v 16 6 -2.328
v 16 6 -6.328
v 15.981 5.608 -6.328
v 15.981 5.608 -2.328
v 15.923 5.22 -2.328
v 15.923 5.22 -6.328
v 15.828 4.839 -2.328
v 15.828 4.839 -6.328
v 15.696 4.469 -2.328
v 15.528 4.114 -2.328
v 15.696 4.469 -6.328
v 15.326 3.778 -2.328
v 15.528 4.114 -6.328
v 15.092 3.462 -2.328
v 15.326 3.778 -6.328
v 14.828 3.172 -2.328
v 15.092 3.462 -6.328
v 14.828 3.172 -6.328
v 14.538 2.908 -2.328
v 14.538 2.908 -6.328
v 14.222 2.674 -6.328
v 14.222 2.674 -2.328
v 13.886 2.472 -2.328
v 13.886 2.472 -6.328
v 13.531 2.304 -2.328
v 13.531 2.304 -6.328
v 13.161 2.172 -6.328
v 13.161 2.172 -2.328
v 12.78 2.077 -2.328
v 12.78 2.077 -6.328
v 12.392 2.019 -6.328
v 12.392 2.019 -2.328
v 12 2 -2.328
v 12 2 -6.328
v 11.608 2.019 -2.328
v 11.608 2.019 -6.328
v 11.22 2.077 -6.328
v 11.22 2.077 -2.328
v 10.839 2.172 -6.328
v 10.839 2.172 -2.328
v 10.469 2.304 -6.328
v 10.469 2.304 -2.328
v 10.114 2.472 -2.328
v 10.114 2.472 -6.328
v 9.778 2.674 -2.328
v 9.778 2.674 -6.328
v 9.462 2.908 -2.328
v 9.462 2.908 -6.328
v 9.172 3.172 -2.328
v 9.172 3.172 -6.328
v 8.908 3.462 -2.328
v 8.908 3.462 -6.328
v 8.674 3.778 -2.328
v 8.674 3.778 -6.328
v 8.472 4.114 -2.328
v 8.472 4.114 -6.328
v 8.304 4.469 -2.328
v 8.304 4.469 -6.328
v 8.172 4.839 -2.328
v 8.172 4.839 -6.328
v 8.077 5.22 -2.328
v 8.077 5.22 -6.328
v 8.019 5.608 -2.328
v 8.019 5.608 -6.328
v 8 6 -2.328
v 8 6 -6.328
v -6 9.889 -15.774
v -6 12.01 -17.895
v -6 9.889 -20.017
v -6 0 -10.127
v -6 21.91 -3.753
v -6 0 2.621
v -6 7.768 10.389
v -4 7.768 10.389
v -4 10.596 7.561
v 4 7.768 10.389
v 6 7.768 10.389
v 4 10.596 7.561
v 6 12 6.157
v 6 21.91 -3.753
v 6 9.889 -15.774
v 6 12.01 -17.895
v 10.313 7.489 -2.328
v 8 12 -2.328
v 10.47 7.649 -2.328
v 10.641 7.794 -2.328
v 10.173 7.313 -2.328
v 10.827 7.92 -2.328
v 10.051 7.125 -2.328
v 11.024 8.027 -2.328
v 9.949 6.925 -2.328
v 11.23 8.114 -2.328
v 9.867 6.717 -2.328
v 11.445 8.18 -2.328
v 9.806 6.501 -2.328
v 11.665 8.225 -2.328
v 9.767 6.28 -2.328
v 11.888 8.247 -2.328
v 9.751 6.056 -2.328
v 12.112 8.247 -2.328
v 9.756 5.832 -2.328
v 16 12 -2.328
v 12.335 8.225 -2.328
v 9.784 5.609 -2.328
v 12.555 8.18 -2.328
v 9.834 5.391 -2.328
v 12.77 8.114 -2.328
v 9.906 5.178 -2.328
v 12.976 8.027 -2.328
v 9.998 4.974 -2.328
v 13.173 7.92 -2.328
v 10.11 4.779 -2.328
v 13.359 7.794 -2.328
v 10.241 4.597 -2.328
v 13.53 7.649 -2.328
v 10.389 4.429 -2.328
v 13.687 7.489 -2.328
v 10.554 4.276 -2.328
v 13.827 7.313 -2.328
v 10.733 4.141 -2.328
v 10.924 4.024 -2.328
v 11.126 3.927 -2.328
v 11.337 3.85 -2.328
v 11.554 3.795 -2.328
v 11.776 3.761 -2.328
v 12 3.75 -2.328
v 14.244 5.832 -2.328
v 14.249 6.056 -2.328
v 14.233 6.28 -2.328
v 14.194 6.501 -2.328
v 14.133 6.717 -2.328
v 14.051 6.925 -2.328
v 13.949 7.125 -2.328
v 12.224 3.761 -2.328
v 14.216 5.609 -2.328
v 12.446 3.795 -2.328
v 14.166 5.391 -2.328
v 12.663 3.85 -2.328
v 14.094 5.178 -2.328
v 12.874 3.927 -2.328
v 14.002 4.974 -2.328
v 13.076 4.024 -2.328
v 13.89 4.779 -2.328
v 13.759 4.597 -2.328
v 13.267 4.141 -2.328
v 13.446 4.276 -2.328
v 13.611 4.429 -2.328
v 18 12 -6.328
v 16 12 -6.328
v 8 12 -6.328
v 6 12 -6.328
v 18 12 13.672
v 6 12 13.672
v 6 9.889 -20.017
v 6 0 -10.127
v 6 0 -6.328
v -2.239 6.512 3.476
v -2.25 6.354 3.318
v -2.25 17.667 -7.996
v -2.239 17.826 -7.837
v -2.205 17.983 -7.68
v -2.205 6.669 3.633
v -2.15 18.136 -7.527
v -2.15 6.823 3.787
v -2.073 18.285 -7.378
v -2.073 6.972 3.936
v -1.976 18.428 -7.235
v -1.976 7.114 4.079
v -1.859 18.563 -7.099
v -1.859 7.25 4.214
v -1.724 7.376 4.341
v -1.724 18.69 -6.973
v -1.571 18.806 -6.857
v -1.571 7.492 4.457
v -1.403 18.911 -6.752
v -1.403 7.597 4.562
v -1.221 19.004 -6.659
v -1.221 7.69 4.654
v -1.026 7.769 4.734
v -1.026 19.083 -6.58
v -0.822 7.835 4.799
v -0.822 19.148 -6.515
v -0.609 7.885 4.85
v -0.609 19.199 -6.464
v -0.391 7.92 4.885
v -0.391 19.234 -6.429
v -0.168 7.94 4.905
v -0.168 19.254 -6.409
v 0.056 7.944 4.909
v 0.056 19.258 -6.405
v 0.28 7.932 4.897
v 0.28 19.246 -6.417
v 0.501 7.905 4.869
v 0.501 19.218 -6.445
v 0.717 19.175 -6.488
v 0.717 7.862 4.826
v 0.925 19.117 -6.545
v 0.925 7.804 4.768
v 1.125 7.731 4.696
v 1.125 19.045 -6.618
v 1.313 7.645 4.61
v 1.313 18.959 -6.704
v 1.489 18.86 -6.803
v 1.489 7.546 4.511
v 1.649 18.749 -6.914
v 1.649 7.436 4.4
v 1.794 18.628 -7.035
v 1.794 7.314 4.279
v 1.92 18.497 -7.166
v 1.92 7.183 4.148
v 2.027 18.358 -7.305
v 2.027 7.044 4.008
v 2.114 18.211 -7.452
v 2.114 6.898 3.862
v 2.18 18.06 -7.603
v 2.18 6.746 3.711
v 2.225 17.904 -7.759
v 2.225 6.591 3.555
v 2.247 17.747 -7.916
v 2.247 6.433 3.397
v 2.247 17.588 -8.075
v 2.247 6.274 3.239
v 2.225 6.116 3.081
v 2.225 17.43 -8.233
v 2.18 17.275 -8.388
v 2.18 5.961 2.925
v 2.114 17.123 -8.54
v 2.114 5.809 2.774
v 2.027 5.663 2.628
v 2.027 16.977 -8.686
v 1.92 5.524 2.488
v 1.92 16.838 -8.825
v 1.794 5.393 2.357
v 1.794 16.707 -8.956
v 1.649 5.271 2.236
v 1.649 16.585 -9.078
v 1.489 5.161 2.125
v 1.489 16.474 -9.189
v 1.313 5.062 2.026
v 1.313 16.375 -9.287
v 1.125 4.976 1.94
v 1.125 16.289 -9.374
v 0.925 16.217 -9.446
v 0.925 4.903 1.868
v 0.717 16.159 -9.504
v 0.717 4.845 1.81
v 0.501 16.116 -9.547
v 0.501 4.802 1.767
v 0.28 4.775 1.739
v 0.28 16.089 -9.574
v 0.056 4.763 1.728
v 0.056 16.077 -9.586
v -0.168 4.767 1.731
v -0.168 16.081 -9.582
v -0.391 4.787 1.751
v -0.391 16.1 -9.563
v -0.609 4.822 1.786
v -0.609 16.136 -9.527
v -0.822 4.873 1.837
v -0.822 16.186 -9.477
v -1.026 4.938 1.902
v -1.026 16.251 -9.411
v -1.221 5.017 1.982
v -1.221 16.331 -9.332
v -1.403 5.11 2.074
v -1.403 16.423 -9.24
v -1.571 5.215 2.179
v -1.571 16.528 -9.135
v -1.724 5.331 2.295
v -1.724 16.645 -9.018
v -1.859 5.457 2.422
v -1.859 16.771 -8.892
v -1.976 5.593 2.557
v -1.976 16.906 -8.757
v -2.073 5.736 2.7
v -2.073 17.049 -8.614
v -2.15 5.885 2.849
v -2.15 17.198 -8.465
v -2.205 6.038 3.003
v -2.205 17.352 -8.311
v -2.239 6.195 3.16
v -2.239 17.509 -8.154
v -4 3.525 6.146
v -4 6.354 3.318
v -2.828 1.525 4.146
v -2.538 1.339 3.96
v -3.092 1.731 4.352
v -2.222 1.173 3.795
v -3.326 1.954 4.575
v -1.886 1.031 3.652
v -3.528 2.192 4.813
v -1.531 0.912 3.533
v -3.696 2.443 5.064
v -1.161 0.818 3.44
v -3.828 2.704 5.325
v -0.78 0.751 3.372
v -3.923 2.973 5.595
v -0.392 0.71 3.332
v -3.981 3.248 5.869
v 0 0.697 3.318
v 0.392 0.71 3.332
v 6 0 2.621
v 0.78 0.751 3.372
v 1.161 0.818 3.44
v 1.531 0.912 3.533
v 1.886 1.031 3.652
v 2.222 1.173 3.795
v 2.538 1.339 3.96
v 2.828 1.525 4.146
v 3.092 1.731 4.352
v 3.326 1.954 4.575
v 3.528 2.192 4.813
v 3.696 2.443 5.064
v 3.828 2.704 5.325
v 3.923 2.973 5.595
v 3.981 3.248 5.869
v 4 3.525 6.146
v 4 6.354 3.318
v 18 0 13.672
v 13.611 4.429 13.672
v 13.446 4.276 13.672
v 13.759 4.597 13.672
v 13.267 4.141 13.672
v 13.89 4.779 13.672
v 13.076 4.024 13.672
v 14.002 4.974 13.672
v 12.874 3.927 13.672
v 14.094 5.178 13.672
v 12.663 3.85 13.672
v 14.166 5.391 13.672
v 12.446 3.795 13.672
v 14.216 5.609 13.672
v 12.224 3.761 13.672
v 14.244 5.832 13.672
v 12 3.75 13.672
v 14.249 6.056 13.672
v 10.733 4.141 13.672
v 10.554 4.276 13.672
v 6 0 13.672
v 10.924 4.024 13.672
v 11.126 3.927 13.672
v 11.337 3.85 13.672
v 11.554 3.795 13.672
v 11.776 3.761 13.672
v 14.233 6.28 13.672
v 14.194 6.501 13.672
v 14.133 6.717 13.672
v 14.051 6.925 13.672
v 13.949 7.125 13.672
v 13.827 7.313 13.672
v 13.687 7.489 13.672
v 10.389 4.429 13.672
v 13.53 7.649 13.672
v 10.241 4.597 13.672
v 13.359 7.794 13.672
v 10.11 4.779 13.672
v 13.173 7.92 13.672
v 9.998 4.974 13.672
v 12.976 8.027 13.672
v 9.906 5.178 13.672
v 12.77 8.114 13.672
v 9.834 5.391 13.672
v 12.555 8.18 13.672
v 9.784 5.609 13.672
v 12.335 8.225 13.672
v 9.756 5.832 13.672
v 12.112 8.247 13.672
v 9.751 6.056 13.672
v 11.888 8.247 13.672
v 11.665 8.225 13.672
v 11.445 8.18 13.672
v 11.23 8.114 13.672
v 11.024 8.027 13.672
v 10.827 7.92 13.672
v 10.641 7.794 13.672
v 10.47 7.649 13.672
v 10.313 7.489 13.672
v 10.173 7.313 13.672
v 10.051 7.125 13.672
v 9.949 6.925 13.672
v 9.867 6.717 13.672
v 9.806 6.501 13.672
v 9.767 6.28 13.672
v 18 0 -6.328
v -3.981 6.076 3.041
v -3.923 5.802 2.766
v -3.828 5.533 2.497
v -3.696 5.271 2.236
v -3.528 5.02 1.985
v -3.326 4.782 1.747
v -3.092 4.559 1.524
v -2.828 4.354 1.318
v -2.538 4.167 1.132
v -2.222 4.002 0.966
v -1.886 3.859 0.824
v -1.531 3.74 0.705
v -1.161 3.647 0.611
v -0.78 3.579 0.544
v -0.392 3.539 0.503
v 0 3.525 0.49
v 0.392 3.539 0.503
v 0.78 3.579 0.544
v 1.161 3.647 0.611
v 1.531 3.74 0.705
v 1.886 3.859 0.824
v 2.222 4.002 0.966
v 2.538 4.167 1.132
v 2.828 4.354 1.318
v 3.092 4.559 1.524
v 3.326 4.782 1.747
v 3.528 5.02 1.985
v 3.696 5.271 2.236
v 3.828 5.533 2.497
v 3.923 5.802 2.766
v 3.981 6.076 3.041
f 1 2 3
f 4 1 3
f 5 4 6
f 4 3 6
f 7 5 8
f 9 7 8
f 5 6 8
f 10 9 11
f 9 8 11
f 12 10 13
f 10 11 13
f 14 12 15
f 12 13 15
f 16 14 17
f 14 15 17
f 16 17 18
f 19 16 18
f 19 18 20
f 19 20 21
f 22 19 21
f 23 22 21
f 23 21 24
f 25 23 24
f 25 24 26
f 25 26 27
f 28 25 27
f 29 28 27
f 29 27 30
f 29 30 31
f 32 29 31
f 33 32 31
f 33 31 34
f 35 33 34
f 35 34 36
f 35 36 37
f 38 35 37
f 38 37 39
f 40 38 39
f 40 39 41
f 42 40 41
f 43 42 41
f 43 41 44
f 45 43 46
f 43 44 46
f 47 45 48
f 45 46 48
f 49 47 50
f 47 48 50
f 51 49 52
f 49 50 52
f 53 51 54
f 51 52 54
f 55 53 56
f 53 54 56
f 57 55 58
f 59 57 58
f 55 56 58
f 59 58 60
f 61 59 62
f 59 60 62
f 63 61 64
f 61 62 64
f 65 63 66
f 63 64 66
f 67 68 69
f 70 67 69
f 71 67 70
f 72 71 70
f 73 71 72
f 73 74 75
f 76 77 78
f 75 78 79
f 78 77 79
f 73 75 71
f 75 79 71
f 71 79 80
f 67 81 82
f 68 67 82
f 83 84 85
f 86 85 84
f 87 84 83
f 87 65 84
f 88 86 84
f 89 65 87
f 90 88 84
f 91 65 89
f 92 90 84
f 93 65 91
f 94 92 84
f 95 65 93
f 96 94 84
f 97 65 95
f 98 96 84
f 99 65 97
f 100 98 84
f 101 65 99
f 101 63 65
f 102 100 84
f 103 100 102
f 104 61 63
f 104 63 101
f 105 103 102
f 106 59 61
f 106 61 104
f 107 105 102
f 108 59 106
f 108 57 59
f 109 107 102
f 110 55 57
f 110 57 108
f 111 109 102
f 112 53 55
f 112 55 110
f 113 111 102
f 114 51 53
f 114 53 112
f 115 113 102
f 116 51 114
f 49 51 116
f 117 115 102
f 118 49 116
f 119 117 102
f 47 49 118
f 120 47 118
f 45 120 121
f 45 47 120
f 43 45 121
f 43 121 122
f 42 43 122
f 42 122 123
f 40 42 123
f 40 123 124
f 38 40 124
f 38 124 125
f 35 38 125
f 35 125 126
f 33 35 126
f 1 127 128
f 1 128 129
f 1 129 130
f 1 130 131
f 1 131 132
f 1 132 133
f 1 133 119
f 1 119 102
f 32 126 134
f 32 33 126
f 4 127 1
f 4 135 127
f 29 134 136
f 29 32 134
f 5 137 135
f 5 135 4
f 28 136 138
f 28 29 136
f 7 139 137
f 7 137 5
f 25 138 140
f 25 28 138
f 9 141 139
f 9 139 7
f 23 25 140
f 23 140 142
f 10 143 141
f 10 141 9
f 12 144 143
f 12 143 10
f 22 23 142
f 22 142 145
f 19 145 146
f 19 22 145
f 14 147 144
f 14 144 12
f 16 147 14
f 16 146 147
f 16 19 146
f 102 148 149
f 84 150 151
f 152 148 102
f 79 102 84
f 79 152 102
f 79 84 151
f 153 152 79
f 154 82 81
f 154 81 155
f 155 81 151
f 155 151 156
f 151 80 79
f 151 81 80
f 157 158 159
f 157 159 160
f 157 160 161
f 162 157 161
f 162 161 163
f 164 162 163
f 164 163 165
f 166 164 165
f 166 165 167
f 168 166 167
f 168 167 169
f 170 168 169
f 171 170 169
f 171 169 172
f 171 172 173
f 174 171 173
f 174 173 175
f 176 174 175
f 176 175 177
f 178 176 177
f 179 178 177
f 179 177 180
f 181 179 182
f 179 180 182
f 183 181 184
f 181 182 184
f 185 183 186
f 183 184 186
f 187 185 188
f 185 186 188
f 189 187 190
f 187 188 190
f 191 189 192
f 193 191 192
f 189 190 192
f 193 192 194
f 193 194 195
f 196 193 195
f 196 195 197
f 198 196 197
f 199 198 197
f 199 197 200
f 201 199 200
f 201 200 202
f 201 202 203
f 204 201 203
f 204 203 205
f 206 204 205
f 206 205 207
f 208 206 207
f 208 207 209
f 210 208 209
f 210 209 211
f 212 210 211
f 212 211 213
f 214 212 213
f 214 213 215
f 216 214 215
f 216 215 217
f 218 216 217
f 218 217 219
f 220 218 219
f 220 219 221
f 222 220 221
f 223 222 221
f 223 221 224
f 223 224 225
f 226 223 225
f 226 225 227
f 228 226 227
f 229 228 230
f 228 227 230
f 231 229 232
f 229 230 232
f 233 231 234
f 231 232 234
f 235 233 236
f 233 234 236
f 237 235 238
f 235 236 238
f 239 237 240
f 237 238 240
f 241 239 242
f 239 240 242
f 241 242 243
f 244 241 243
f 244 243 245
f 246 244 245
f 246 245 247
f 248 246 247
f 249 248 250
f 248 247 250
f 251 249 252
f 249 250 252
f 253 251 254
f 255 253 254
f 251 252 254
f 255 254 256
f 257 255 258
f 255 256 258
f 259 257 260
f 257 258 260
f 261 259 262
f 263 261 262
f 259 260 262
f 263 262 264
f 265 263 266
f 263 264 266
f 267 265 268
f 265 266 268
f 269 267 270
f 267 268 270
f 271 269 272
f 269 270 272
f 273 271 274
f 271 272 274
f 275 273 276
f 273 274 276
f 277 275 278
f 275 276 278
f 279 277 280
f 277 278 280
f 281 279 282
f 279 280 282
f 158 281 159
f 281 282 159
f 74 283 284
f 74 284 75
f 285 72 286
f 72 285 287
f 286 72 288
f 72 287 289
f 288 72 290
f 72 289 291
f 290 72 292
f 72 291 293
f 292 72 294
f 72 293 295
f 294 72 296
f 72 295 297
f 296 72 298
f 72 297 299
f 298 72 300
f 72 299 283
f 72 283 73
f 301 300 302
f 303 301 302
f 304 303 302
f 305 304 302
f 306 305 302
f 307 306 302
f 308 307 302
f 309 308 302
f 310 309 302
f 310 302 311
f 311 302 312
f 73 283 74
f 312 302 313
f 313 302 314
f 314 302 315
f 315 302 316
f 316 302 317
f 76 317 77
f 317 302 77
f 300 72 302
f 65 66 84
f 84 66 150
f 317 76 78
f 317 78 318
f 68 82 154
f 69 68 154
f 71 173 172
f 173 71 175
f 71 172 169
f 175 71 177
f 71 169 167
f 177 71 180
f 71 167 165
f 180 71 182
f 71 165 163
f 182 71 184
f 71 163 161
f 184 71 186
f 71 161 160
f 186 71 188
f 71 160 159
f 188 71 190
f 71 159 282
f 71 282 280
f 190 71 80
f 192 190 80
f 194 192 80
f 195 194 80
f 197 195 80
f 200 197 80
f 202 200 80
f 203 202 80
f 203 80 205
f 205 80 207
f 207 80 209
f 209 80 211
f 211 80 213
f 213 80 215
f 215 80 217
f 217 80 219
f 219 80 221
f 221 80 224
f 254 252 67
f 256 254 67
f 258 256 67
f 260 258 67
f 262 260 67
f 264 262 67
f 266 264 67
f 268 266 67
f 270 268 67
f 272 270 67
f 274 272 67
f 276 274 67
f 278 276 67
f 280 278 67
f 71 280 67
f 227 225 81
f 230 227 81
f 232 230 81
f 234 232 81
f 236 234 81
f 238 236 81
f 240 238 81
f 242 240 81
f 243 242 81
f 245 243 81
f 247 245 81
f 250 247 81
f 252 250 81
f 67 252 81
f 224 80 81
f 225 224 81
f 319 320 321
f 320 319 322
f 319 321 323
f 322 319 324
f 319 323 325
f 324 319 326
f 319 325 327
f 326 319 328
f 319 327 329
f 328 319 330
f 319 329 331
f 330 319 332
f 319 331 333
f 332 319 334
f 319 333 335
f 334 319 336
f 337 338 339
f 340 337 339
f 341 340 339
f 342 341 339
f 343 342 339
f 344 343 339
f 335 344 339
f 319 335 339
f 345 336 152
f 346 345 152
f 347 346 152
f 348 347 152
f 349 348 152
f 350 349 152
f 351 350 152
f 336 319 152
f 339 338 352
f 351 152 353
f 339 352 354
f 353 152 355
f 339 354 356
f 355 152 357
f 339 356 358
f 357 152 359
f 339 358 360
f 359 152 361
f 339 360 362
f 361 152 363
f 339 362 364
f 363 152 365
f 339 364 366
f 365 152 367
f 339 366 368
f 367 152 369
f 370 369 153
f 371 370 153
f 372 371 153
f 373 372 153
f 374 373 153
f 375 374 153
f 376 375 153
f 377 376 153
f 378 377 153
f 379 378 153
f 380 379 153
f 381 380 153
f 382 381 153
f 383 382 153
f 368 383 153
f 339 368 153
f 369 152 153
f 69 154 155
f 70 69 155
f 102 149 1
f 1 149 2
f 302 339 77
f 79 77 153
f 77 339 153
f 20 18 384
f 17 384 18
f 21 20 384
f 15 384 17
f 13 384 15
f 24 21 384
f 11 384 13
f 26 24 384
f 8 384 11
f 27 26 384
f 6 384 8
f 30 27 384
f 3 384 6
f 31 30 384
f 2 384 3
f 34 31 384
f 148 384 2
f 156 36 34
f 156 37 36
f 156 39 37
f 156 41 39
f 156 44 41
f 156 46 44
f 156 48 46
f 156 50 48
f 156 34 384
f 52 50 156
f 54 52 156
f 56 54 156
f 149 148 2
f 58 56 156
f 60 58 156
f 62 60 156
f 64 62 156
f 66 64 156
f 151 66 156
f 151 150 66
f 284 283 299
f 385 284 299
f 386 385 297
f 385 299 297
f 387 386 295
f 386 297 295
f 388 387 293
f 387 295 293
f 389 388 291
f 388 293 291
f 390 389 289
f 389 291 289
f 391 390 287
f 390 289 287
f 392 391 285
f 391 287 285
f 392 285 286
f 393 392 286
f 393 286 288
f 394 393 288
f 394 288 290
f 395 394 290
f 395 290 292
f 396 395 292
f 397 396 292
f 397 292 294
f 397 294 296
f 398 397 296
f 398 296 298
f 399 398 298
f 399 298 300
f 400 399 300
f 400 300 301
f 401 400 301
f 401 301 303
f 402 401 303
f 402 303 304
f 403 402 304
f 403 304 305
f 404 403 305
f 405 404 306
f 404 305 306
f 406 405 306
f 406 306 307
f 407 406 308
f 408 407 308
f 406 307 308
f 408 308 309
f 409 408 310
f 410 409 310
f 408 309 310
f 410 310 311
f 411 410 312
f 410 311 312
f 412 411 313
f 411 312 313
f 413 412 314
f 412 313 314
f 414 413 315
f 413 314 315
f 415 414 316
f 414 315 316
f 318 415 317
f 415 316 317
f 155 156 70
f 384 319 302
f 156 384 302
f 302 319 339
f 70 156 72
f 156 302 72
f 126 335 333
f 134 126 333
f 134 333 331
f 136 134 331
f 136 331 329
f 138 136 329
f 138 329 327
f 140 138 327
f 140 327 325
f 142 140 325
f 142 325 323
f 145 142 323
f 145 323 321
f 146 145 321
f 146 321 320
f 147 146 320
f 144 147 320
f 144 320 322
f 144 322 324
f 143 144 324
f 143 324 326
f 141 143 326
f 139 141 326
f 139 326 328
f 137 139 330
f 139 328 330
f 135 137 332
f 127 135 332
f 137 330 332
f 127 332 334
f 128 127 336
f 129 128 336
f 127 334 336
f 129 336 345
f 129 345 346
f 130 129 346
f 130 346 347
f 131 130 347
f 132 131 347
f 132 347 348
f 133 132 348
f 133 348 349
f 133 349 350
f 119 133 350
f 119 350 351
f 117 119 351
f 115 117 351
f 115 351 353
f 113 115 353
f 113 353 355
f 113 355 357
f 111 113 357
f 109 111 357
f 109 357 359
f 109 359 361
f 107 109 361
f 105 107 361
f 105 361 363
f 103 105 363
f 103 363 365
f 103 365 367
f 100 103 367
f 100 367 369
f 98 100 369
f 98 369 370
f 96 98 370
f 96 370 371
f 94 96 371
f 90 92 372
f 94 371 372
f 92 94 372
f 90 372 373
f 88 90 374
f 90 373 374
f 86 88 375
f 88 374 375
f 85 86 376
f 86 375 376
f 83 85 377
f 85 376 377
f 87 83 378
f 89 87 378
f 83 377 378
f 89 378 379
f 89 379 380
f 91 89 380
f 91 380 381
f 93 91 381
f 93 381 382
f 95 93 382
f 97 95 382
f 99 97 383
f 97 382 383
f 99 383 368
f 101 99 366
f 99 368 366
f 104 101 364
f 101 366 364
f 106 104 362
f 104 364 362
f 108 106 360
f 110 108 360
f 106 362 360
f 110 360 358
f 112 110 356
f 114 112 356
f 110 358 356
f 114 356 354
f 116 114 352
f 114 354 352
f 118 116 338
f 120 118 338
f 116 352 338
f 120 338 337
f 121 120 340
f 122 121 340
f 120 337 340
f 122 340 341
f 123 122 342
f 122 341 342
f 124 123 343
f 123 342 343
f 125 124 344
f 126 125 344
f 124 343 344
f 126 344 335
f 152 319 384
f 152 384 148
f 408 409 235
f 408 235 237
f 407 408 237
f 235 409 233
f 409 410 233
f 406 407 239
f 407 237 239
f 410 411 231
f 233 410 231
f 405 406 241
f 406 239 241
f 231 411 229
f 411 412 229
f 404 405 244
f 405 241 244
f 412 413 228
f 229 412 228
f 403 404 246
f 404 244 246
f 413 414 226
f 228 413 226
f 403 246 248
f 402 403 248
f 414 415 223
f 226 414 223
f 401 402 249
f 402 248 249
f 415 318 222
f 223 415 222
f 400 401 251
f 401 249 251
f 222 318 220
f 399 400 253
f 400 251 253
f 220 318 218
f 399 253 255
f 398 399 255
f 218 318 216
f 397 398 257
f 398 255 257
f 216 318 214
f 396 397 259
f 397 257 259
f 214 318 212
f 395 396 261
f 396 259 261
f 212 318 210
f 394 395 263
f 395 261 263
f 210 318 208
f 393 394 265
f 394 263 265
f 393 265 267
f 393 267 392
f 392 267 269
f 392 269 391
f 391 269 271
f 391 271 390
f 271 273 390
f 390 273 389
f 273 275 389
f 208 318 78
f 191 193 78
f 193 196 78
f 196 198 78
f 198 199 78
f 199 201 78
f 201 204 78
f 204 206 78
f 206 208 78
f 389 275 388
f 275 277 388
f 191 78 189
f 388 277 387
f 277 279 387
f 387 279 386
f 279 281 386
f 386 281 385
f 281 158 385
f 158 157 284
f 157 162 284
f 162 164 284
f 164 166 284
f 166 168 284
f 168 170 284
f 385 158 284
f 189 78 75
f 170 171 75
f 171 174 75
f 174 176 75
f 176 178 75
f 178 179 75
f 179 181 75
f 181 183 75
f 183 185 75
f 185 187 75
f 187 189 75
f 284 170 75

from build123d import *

# Parameters (mm, degrees)
FRAME_BODY_EXT_DEPTH                  = 6
FRAME_BODY_EXT_DEPTH_BACK             = 6
SKETCH6_R                             = 2.25
FRAME_BOLT_CUT_DEPTH                  = 26.13961018
SKETCH9_W                             = 12
SKETCH9_H                             = 12
CASE_BODY_EXT_DEPTH                   = 20
SKETCH10_R                            = 2.25
CASE_BOLT_CUT_DEPTH                   = 39.721912961
PRINT_PLANE_CUT_REACH                 = 31.479
SKETCH11_R                            = 4
CASE_COUNTERBORE_CUT_DEPTH            = 4
SKETCH7_R                             = 4
FRAME_COUNTERBORE_CUT_DEPTH           = 4
FRAME_COUNTERBORE_EXTENSION_CUT_DEPTH = 4
CASE_COUNTERBORE_EXTENSION_CUT_DEPTH  = 4
ROTATION_ONTO_PRINT_PLANE_ANGLE       = 45


with BuildPart() as part:
    # Sketch5 → Frame Body Ext (new, two sides: drawn at the far end of the back side and taken through both)
    with BuildSketch(Plane.ZY.offset(-FRAME_BODY_EXT_DEPTH_BACK)):
        Polygon((-20, 6), (-20, -11), (-23, -11), (-23, -14), (0, -14), (0, 6), align=None)
    extrude(amount=FRAME_BODY_EXT_DEPTH + FRAME_BODY_EXT_DEPTH_BACK)

    # Sketch6 → Frame Bolt Cut (cut, through all)
    with BuildSketch(Plane(origin=(0, 0, -20), x_dir=(-1, 0, 0), z_dir=(0, 0, -1))):
        Circle(SKETCH6_R)
    extrude(amount=-FRAME_BOLT_CUT_DEPTH, mode=Mode.SUBTRACT)

    # Sketch9 → Case Body Ext (add)
    with BuildSketch(Plane(origin=(12, 7.071067812, 3.571067812), x_dir=(-1, 0, 0), z_dir=(0, -0.7071067811865486, -0.7071067811865465))):
        Rectangle(SKETCH9_W, SKETCH9_H)
    extrude(amount=CASE_BODY_EXT_DEPTH)

    # Sketch10 → Case Bolt Cut (cut, through all)
    with BuildSketch(Plane(origin=(0, 5.321067812, 5.321067812), x_dir=(1, 0, 0), z_dir=(0, 0.7071067811865487, 0.7071067811865465))):
        with Locations(Location((12, 2.474873734, 0), (0, 0, 270))):
            Circle(SKETCH10_R)
    extrude(amount=-CASE_BOLT_CUT_DEPTH, mode=Mode.SUBTRACT)

    # Sketch14 → Print Plane Cut (cut, up to next)
    with BuildSketch(Plane(origin=(6, 0, 0), x_dir=(0, 0, -1), z_dir=(1, 0, 0)), mode=Mode.PRIVATE) as print_plane_cut_sk1:
        Polygon((0, -4.985281374), (9.014718626, -14), (0, -14), align=None)
    print_plane_cut_tool1 = extrude(print_plane_cut_sk1.sketch, amount=-PRINT_PLANE_CUT_REACH, mode=Mode.PRIVATE) & part.part
    add(print_plane_cut_tool1.solids().sort_by_distance((6, -10.995094, -3.004906))[0], mode=Mode.SUBTRACT)

    # Sketch11 → Case Counterbore Cut (cut)
    with BuildSketch(Plane(origin=(0, -8.821067812, -8.821067812), x_dir=(1, 0, 0), z_dir=(0, -0.7071067811865487, -0.7071067811865465))):
        with Locations(Location((12, -2.474873734, 0), (0, 0, 270))):
            Circle(SKETCH11_R)
    extrude(amount=-CASE_COUNTERBORE_CUT_DEPTH, mode=Mode.SUBTRACT)

    # Sketch7 → Frame Counterbore Cut (cut)
    with BuildSketch(Plane.XY):
        Circle(SKETCH7_R)
    extrude(amount=-FRAME_COUNTERBORE_CUT_DEPTH, mode=Mode.SUBTRACT)

    # Sketch15 → Frame Counterbore Extension Cut (cut)
    with BuildSketch(Plane.XY):
        with BuildLine():
            Line((-4, 0), (-4, 6))
            Line((-4, 6), (4, 6))
            Line((4, 6), (4, 0))
            ThreePointArc((4, 0), (0, 4), (-4, 0))
        make_face()
    extrude(amount=-FRAME_COUNTERBORE_EXTENSION_CUT_DEPTH, mode=Mode.SUBTRACT)

    # Sketch16 → Case Counterbore Extension Cut (cut)
    with BuildSketch(Plane(origin=(0, -8.821067812, -8.821067812), x_dir=(1, 0, 0), z_dir=(0, -0.7071067811865486, -0.7071067811865465))):
        with BuildLine():
            Line((16, -8.474873734), (16, -2.474873734))
            ThreePointArc((16, -2.474873734), (12, -6.474873734), (8, -2.474873734))
            Line((8, -2.474873734), (8, -8.474873734))
            Line((8, -8.474873734), (16, -8.474873734))
        make_face()
    extrude(amount=-CASE_COUNTERBORE_EXTENSION_CUT_DEPTH, mode=Mode.SUBTRACT)


with BuildPart() as part_1:
    # Rotation onto Print Plane: read off the stored shape, not the designer's step
    # Rotation onto Print Plane: moved
    add(part.part.moved(Location((0, 6.8388348, 1.8535534))).rotate(Axis((0, 0, 0), (1, 0, 0)), ROTATION_ONTO_PRINT_PLANE_ANGLE))


solid = part_1.part
